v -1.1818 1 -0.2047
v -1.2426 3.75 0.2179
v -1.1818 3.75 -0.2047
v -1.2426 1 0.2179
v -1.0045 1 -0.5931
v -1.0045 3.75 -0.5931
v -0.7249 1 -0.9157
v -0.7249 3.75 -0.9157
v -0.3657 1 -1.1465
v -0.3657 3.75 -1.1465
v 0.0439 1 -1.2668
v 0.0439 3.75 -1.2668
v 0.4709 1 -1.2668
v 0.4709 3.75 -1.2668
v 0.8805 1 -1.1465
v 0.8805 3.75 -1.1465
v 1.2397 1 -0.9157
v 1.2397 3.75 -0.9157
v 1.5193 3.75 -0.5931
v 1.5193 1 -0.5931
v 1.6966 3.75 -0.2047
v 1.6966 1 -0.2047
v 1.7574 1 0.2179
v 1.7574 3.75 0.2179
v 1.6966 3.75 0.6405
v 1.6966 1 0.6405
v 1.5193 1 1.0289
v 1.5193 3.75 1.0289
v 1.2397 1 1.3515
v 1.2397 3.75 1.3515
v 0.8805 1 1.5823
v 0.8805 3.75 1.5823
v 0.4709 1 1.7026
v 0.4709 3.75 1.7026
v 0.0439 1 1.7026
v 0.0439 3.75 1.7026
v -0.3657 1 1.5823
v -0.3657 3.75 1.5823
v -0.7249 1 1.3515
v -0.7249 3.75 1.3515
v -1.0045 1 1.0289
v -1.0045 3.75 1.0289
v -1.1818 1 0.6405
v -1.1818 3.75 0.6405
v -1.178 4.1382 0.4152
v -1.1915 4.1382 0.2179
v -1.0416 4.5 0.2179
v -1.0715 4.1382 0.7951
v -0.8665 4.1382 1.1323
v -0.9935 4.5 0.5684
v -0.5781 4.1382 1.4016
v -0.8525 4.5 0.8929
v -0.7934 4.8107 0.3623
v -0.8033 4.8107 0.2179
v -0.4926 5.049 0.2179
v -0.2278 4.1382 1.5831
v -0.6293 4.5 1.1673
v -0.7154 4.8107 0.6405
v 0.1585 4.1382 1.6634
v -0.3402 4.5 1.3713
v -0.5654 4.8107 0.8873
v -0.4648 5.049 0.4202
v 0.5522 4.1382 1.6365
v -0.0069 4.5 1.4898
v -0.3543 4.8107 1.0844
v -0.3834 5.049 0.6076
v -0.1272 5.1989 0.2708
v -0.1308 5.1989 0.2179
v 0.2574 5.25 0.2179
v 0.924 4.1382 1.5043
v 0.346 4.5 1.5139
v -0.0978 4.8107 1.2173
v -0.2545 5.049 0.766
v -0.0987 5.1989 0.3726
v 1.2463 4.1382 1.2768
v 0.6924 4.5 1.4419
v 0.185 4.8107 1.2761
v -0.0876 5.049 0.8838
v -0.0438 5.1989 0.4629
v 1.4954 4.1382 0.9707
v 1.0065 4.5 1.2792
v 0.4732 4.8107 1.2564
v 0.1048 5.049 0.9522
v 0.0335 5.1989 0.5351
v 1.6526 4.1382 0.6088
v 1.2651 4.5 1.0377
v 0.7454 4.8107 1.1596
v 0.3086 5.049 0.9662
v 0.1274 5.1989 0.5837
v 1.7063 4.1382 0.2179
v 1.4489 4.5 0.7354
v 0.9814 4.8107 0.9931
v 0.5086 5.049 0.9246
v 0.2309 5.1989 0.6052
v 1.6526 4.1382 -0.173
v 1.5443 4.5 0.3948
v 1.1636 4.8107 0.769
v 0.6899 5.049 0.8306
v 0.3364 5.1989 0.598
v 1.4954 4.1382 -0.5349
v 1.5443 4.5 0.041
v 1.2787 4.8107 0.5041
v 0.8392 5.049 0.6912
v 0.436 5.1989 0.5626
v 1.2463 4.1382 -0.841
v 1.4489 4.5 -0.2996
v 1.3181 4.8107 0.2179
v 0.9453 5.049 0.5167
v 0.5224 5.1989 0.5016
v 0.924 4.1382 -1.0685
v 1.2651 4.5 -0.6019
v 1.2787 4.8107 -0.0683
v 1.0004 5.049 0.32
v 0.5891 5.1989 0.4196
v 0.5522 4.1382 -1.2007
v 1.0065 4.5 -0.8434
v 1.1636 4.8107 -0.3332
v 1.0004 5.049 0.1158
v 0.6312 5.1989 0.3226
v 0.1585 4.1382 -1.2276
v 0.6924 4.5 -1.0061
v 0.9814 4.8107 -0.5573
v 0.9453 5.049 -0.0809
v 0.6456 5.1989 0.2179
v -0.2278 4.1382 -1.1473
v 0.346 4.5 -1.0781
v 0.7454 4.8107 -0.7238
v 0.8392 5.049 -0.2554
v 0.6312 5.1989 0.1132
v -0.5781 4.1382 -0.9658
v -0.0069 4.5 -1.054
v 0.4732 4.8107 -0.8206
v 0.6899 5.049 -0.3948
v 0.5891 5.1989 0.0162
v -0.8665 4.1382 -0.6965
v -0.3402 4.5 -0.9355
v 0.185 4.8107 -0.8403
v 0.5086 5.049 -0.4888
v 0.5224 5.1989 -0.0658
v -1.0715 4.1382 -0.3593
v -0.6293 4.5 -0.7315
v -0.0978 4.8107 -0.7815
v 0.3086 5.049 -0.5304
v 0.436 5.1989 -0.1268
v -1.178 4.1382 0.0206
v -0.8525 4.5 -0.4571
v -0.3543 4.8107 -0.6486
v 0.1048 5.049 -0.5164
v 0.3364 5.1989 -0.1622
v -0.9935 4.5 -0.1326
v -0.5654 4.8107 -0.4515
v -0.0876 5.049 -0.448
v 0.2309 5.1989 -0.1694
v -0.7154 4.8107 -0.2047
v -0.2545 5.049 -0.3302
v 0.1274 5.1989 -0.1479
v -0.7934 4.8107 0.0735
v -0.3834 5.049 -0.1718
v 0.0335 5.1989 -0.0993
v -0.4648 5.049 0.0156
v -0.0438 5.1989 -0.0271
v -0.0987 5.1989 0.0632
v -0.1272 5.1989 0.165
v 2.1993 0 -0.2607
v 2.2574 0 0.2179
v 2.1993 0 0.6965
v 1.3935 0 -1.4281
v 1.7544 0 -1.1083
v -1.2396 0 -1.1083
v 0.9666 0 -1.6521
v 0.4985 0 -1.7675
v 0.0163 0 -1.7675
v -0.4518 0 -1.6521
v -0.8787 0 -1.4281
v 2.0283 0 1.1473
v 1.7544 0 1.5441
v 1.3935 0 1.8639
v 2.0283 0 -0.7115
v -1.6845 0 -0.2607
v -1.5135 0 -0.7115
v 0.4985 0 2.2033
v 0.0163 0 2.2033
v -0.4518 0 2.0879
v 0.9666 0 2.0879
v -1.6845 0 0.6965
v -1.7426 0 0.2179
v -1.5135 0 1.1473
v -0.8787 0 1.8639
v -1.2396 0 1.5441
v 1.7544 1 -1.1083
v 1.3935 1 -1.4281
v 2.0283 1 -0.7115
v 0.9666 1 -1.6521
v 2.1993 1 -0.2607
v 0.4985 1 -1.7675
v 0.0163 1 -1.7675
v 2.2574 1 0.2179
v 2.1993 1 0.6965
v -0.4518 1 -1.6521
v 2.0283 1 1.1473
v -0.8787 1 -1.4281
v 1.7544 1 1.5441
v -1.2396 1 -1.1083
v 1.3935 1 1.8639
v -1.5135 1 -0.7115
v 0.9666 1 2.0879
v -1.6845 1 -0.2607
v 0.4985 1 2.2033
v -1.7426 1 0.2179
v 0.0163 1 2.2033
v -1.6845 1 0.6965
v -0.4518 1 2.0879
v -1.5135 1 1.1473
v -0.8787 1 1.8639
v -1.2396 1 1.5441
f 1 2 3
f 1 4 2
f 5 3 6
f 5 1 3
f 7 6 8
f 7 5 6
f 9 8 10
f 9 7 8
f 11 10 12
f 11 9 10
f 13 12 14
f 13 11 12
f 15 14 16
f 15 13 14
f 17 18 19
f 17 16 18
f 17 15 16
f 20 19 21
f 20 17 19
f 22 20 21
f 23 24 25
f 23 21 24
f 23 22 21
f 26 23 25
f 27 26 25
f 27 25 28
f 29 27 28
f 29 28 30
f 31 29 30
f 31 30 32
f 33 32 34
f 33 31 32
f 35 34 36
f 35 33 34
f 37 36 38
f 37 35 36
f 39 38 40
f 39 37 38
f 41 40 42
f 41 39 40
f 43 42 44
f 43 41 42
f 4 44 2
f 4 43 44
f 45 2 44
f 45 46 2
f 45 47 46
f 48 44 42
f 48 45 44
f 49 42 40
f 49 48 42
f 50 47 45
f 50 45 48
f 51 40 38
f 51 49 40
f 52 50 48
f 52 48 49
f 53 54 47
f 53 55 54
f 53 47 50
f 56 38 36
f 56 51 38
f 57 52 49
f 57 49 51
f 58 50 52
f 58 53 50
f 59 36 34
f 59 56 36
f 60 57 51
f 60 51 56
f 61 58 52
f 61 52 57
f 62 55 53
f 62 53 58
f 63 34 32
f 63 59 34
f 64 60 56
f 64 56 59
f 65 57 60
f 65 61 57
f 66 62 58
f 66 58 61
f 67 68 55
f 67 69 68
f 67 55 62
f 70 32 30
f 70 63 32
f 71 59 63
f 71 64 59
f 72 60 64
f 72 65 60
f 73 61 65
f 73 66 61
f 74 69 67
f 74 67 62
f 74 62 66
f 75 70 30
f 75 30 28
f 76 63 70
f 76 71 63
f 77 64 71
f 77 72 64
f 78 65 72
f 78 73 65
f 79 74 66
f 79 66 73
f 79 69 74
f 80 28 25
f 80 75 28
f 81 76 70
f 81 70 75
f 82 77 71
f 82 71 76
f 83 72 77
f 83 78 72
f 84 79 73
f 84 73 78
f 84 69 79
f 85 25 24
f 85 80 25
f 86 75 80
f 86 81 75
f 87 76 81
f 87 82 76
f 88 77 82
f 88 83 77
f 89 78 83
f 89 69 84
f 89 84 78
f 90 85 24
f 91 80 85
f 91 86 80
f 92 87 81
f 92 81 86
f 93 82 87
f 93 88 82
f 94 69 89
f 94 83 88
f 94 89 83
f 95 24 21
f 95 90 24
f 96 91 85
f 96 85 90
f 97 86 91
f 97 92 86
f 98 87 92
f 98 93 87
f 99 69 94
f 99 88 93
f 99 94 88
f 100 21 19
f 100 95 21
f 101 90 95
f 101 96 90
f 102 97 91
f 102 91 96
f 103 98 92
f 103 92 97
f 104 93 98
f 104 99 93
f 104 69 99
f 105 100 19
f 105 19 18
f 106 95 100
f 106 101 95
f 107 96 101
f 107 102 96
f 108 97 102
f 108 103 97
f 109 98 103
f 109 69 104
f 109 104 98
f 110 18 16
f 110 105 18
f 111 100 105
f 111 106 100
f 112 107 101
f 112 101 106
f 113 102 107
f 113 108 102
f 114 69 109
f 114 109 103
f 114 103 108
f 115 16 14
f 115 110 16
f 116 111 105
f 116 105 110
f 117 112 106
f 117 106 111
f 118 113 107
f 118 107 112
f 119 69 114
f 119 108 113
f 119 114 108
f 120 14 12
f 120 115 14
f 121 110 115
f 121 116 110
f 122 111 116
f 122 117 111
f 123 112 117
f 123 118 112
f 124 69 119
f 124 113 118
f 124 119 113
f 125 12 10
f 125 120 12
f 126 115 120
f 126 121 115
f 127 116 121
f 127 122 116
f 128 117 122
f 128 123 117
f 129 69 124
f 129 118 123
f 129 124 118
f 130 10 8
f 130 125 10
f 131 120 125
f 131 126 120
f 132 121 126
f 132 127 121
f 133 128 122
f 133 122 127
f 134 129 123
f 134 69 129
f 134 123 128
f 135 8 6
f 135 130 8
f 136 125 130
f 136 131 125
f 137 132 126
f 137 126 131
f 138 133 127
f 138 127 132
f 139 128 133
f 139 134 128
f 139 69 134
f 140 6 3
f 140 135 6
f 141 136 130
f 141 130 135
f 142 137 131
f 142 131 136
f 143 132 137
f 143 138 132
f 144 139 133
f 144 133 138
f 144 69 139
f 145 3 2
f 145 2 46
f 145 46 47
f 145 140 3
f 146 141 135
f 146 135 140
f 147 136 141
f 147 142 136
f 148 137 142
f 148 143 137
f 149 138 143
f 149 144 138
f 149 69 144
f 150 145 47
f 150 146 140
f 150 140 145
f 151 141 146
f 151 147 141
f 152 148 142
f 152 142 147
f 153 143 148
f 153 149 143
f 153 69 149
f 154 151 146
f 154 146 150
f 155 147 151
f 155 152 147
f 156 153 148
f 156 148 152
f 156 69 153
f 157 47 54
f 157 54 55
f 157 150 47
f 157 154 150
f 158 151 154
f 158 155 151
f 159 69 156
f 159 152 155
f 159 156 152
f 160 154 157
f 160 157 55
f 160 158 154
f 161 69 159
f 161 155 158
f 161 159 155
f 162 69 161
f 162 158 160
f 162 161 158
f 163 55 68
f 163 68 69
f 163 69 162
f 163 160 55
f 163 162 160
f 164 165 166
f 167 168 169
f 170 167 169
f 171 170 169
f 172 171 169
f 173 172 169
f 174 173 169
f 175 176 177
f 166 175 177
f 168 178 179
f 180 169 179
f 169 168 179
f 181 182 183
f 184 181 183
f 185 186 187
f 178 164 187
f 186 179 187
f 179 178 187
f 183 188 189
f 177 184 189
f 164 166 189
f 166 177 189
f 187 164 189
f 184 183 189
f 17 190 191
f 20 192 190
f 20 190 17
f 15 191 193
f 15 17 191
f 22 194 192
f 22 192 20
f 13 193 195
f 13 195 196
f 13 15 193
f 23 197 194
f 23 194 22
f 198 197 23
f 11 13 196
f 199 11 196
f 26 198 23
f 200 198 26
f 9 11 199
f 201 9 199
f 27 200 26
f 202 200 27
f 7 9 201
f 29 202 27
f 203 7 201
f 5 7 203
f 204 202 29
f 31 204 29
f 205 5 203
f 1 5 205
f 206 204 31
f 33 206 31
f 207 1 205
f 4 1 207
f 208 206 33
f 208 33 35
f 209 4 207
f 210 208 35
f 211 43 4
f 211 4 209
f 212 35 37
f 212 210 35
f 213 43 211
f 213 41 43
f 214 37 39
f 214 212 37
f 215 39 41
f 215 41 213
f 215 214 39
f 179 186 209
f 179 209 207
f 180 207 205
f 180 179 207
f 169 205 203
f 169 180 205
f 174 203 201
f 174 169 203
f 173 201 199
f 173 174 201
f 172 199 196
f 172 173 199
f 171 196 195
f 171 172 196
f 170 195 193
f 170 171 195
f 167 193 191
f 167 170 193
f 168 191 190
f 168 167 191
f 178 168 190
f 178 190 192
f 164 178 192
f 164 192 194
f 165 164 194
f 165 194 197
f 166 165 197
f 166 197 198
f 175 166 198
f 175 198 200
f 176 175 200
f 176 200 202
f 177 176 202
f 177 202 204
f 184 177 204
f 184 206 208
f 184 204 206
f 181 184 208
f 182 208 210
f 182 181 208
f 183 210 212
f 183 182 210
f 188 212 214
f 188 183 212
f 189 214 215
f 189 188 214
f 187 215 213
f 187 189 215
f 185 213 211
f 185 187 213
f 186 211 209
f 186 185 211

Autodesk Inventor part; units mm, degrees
ref_plane "YZ Plane" through (0, 0, 0) normal (1, 0, 0) x (0, 1, 0)
ref_plane "XZ Plane" through (0, 0, 0) normal (0, 1, 0) x (-1, 0, 0)
ref_plane "XY Plane" through (0, 0, 0) normal (0, 0, 1) x (1, 0, 0)
sketch "Sketch1" plane through (0, 0, 0) normal (0, 1, 0) x (-1, 0, 0)
  circle A0 centre (-0.2574, 0.2179) radius 1.5
  point P0 (0, 0)
  dimension "d0" = 3
extrude "Extrusion1" add sketch "Sketch1" along normal blind 5.25
fillet "Fillet1" radius 1.5 1 edges at (1.7574, 5.25, 0.2179)
sketch "Sketch2" plane through (0, 0, 0) normal (0, 1, 0) x (-1, 0, 0)
  circle A0 centre (-0.2574, 0.2179) radius 2
  circle A1 centre (-0.2574, 0.2179) radius 1.5 projected
  circle A2 centre (-0.2574, 0.2179) radius 1.5
  point P0 (0, 0)
  dimension "d4" = 0
  dimension "d5" = 4
  dimension "d6" = 0.5
extrude "Extrusion2" add sketch "Sketch2" along normal blind 1
properties part number "LTR_4206E_Photodiode"
